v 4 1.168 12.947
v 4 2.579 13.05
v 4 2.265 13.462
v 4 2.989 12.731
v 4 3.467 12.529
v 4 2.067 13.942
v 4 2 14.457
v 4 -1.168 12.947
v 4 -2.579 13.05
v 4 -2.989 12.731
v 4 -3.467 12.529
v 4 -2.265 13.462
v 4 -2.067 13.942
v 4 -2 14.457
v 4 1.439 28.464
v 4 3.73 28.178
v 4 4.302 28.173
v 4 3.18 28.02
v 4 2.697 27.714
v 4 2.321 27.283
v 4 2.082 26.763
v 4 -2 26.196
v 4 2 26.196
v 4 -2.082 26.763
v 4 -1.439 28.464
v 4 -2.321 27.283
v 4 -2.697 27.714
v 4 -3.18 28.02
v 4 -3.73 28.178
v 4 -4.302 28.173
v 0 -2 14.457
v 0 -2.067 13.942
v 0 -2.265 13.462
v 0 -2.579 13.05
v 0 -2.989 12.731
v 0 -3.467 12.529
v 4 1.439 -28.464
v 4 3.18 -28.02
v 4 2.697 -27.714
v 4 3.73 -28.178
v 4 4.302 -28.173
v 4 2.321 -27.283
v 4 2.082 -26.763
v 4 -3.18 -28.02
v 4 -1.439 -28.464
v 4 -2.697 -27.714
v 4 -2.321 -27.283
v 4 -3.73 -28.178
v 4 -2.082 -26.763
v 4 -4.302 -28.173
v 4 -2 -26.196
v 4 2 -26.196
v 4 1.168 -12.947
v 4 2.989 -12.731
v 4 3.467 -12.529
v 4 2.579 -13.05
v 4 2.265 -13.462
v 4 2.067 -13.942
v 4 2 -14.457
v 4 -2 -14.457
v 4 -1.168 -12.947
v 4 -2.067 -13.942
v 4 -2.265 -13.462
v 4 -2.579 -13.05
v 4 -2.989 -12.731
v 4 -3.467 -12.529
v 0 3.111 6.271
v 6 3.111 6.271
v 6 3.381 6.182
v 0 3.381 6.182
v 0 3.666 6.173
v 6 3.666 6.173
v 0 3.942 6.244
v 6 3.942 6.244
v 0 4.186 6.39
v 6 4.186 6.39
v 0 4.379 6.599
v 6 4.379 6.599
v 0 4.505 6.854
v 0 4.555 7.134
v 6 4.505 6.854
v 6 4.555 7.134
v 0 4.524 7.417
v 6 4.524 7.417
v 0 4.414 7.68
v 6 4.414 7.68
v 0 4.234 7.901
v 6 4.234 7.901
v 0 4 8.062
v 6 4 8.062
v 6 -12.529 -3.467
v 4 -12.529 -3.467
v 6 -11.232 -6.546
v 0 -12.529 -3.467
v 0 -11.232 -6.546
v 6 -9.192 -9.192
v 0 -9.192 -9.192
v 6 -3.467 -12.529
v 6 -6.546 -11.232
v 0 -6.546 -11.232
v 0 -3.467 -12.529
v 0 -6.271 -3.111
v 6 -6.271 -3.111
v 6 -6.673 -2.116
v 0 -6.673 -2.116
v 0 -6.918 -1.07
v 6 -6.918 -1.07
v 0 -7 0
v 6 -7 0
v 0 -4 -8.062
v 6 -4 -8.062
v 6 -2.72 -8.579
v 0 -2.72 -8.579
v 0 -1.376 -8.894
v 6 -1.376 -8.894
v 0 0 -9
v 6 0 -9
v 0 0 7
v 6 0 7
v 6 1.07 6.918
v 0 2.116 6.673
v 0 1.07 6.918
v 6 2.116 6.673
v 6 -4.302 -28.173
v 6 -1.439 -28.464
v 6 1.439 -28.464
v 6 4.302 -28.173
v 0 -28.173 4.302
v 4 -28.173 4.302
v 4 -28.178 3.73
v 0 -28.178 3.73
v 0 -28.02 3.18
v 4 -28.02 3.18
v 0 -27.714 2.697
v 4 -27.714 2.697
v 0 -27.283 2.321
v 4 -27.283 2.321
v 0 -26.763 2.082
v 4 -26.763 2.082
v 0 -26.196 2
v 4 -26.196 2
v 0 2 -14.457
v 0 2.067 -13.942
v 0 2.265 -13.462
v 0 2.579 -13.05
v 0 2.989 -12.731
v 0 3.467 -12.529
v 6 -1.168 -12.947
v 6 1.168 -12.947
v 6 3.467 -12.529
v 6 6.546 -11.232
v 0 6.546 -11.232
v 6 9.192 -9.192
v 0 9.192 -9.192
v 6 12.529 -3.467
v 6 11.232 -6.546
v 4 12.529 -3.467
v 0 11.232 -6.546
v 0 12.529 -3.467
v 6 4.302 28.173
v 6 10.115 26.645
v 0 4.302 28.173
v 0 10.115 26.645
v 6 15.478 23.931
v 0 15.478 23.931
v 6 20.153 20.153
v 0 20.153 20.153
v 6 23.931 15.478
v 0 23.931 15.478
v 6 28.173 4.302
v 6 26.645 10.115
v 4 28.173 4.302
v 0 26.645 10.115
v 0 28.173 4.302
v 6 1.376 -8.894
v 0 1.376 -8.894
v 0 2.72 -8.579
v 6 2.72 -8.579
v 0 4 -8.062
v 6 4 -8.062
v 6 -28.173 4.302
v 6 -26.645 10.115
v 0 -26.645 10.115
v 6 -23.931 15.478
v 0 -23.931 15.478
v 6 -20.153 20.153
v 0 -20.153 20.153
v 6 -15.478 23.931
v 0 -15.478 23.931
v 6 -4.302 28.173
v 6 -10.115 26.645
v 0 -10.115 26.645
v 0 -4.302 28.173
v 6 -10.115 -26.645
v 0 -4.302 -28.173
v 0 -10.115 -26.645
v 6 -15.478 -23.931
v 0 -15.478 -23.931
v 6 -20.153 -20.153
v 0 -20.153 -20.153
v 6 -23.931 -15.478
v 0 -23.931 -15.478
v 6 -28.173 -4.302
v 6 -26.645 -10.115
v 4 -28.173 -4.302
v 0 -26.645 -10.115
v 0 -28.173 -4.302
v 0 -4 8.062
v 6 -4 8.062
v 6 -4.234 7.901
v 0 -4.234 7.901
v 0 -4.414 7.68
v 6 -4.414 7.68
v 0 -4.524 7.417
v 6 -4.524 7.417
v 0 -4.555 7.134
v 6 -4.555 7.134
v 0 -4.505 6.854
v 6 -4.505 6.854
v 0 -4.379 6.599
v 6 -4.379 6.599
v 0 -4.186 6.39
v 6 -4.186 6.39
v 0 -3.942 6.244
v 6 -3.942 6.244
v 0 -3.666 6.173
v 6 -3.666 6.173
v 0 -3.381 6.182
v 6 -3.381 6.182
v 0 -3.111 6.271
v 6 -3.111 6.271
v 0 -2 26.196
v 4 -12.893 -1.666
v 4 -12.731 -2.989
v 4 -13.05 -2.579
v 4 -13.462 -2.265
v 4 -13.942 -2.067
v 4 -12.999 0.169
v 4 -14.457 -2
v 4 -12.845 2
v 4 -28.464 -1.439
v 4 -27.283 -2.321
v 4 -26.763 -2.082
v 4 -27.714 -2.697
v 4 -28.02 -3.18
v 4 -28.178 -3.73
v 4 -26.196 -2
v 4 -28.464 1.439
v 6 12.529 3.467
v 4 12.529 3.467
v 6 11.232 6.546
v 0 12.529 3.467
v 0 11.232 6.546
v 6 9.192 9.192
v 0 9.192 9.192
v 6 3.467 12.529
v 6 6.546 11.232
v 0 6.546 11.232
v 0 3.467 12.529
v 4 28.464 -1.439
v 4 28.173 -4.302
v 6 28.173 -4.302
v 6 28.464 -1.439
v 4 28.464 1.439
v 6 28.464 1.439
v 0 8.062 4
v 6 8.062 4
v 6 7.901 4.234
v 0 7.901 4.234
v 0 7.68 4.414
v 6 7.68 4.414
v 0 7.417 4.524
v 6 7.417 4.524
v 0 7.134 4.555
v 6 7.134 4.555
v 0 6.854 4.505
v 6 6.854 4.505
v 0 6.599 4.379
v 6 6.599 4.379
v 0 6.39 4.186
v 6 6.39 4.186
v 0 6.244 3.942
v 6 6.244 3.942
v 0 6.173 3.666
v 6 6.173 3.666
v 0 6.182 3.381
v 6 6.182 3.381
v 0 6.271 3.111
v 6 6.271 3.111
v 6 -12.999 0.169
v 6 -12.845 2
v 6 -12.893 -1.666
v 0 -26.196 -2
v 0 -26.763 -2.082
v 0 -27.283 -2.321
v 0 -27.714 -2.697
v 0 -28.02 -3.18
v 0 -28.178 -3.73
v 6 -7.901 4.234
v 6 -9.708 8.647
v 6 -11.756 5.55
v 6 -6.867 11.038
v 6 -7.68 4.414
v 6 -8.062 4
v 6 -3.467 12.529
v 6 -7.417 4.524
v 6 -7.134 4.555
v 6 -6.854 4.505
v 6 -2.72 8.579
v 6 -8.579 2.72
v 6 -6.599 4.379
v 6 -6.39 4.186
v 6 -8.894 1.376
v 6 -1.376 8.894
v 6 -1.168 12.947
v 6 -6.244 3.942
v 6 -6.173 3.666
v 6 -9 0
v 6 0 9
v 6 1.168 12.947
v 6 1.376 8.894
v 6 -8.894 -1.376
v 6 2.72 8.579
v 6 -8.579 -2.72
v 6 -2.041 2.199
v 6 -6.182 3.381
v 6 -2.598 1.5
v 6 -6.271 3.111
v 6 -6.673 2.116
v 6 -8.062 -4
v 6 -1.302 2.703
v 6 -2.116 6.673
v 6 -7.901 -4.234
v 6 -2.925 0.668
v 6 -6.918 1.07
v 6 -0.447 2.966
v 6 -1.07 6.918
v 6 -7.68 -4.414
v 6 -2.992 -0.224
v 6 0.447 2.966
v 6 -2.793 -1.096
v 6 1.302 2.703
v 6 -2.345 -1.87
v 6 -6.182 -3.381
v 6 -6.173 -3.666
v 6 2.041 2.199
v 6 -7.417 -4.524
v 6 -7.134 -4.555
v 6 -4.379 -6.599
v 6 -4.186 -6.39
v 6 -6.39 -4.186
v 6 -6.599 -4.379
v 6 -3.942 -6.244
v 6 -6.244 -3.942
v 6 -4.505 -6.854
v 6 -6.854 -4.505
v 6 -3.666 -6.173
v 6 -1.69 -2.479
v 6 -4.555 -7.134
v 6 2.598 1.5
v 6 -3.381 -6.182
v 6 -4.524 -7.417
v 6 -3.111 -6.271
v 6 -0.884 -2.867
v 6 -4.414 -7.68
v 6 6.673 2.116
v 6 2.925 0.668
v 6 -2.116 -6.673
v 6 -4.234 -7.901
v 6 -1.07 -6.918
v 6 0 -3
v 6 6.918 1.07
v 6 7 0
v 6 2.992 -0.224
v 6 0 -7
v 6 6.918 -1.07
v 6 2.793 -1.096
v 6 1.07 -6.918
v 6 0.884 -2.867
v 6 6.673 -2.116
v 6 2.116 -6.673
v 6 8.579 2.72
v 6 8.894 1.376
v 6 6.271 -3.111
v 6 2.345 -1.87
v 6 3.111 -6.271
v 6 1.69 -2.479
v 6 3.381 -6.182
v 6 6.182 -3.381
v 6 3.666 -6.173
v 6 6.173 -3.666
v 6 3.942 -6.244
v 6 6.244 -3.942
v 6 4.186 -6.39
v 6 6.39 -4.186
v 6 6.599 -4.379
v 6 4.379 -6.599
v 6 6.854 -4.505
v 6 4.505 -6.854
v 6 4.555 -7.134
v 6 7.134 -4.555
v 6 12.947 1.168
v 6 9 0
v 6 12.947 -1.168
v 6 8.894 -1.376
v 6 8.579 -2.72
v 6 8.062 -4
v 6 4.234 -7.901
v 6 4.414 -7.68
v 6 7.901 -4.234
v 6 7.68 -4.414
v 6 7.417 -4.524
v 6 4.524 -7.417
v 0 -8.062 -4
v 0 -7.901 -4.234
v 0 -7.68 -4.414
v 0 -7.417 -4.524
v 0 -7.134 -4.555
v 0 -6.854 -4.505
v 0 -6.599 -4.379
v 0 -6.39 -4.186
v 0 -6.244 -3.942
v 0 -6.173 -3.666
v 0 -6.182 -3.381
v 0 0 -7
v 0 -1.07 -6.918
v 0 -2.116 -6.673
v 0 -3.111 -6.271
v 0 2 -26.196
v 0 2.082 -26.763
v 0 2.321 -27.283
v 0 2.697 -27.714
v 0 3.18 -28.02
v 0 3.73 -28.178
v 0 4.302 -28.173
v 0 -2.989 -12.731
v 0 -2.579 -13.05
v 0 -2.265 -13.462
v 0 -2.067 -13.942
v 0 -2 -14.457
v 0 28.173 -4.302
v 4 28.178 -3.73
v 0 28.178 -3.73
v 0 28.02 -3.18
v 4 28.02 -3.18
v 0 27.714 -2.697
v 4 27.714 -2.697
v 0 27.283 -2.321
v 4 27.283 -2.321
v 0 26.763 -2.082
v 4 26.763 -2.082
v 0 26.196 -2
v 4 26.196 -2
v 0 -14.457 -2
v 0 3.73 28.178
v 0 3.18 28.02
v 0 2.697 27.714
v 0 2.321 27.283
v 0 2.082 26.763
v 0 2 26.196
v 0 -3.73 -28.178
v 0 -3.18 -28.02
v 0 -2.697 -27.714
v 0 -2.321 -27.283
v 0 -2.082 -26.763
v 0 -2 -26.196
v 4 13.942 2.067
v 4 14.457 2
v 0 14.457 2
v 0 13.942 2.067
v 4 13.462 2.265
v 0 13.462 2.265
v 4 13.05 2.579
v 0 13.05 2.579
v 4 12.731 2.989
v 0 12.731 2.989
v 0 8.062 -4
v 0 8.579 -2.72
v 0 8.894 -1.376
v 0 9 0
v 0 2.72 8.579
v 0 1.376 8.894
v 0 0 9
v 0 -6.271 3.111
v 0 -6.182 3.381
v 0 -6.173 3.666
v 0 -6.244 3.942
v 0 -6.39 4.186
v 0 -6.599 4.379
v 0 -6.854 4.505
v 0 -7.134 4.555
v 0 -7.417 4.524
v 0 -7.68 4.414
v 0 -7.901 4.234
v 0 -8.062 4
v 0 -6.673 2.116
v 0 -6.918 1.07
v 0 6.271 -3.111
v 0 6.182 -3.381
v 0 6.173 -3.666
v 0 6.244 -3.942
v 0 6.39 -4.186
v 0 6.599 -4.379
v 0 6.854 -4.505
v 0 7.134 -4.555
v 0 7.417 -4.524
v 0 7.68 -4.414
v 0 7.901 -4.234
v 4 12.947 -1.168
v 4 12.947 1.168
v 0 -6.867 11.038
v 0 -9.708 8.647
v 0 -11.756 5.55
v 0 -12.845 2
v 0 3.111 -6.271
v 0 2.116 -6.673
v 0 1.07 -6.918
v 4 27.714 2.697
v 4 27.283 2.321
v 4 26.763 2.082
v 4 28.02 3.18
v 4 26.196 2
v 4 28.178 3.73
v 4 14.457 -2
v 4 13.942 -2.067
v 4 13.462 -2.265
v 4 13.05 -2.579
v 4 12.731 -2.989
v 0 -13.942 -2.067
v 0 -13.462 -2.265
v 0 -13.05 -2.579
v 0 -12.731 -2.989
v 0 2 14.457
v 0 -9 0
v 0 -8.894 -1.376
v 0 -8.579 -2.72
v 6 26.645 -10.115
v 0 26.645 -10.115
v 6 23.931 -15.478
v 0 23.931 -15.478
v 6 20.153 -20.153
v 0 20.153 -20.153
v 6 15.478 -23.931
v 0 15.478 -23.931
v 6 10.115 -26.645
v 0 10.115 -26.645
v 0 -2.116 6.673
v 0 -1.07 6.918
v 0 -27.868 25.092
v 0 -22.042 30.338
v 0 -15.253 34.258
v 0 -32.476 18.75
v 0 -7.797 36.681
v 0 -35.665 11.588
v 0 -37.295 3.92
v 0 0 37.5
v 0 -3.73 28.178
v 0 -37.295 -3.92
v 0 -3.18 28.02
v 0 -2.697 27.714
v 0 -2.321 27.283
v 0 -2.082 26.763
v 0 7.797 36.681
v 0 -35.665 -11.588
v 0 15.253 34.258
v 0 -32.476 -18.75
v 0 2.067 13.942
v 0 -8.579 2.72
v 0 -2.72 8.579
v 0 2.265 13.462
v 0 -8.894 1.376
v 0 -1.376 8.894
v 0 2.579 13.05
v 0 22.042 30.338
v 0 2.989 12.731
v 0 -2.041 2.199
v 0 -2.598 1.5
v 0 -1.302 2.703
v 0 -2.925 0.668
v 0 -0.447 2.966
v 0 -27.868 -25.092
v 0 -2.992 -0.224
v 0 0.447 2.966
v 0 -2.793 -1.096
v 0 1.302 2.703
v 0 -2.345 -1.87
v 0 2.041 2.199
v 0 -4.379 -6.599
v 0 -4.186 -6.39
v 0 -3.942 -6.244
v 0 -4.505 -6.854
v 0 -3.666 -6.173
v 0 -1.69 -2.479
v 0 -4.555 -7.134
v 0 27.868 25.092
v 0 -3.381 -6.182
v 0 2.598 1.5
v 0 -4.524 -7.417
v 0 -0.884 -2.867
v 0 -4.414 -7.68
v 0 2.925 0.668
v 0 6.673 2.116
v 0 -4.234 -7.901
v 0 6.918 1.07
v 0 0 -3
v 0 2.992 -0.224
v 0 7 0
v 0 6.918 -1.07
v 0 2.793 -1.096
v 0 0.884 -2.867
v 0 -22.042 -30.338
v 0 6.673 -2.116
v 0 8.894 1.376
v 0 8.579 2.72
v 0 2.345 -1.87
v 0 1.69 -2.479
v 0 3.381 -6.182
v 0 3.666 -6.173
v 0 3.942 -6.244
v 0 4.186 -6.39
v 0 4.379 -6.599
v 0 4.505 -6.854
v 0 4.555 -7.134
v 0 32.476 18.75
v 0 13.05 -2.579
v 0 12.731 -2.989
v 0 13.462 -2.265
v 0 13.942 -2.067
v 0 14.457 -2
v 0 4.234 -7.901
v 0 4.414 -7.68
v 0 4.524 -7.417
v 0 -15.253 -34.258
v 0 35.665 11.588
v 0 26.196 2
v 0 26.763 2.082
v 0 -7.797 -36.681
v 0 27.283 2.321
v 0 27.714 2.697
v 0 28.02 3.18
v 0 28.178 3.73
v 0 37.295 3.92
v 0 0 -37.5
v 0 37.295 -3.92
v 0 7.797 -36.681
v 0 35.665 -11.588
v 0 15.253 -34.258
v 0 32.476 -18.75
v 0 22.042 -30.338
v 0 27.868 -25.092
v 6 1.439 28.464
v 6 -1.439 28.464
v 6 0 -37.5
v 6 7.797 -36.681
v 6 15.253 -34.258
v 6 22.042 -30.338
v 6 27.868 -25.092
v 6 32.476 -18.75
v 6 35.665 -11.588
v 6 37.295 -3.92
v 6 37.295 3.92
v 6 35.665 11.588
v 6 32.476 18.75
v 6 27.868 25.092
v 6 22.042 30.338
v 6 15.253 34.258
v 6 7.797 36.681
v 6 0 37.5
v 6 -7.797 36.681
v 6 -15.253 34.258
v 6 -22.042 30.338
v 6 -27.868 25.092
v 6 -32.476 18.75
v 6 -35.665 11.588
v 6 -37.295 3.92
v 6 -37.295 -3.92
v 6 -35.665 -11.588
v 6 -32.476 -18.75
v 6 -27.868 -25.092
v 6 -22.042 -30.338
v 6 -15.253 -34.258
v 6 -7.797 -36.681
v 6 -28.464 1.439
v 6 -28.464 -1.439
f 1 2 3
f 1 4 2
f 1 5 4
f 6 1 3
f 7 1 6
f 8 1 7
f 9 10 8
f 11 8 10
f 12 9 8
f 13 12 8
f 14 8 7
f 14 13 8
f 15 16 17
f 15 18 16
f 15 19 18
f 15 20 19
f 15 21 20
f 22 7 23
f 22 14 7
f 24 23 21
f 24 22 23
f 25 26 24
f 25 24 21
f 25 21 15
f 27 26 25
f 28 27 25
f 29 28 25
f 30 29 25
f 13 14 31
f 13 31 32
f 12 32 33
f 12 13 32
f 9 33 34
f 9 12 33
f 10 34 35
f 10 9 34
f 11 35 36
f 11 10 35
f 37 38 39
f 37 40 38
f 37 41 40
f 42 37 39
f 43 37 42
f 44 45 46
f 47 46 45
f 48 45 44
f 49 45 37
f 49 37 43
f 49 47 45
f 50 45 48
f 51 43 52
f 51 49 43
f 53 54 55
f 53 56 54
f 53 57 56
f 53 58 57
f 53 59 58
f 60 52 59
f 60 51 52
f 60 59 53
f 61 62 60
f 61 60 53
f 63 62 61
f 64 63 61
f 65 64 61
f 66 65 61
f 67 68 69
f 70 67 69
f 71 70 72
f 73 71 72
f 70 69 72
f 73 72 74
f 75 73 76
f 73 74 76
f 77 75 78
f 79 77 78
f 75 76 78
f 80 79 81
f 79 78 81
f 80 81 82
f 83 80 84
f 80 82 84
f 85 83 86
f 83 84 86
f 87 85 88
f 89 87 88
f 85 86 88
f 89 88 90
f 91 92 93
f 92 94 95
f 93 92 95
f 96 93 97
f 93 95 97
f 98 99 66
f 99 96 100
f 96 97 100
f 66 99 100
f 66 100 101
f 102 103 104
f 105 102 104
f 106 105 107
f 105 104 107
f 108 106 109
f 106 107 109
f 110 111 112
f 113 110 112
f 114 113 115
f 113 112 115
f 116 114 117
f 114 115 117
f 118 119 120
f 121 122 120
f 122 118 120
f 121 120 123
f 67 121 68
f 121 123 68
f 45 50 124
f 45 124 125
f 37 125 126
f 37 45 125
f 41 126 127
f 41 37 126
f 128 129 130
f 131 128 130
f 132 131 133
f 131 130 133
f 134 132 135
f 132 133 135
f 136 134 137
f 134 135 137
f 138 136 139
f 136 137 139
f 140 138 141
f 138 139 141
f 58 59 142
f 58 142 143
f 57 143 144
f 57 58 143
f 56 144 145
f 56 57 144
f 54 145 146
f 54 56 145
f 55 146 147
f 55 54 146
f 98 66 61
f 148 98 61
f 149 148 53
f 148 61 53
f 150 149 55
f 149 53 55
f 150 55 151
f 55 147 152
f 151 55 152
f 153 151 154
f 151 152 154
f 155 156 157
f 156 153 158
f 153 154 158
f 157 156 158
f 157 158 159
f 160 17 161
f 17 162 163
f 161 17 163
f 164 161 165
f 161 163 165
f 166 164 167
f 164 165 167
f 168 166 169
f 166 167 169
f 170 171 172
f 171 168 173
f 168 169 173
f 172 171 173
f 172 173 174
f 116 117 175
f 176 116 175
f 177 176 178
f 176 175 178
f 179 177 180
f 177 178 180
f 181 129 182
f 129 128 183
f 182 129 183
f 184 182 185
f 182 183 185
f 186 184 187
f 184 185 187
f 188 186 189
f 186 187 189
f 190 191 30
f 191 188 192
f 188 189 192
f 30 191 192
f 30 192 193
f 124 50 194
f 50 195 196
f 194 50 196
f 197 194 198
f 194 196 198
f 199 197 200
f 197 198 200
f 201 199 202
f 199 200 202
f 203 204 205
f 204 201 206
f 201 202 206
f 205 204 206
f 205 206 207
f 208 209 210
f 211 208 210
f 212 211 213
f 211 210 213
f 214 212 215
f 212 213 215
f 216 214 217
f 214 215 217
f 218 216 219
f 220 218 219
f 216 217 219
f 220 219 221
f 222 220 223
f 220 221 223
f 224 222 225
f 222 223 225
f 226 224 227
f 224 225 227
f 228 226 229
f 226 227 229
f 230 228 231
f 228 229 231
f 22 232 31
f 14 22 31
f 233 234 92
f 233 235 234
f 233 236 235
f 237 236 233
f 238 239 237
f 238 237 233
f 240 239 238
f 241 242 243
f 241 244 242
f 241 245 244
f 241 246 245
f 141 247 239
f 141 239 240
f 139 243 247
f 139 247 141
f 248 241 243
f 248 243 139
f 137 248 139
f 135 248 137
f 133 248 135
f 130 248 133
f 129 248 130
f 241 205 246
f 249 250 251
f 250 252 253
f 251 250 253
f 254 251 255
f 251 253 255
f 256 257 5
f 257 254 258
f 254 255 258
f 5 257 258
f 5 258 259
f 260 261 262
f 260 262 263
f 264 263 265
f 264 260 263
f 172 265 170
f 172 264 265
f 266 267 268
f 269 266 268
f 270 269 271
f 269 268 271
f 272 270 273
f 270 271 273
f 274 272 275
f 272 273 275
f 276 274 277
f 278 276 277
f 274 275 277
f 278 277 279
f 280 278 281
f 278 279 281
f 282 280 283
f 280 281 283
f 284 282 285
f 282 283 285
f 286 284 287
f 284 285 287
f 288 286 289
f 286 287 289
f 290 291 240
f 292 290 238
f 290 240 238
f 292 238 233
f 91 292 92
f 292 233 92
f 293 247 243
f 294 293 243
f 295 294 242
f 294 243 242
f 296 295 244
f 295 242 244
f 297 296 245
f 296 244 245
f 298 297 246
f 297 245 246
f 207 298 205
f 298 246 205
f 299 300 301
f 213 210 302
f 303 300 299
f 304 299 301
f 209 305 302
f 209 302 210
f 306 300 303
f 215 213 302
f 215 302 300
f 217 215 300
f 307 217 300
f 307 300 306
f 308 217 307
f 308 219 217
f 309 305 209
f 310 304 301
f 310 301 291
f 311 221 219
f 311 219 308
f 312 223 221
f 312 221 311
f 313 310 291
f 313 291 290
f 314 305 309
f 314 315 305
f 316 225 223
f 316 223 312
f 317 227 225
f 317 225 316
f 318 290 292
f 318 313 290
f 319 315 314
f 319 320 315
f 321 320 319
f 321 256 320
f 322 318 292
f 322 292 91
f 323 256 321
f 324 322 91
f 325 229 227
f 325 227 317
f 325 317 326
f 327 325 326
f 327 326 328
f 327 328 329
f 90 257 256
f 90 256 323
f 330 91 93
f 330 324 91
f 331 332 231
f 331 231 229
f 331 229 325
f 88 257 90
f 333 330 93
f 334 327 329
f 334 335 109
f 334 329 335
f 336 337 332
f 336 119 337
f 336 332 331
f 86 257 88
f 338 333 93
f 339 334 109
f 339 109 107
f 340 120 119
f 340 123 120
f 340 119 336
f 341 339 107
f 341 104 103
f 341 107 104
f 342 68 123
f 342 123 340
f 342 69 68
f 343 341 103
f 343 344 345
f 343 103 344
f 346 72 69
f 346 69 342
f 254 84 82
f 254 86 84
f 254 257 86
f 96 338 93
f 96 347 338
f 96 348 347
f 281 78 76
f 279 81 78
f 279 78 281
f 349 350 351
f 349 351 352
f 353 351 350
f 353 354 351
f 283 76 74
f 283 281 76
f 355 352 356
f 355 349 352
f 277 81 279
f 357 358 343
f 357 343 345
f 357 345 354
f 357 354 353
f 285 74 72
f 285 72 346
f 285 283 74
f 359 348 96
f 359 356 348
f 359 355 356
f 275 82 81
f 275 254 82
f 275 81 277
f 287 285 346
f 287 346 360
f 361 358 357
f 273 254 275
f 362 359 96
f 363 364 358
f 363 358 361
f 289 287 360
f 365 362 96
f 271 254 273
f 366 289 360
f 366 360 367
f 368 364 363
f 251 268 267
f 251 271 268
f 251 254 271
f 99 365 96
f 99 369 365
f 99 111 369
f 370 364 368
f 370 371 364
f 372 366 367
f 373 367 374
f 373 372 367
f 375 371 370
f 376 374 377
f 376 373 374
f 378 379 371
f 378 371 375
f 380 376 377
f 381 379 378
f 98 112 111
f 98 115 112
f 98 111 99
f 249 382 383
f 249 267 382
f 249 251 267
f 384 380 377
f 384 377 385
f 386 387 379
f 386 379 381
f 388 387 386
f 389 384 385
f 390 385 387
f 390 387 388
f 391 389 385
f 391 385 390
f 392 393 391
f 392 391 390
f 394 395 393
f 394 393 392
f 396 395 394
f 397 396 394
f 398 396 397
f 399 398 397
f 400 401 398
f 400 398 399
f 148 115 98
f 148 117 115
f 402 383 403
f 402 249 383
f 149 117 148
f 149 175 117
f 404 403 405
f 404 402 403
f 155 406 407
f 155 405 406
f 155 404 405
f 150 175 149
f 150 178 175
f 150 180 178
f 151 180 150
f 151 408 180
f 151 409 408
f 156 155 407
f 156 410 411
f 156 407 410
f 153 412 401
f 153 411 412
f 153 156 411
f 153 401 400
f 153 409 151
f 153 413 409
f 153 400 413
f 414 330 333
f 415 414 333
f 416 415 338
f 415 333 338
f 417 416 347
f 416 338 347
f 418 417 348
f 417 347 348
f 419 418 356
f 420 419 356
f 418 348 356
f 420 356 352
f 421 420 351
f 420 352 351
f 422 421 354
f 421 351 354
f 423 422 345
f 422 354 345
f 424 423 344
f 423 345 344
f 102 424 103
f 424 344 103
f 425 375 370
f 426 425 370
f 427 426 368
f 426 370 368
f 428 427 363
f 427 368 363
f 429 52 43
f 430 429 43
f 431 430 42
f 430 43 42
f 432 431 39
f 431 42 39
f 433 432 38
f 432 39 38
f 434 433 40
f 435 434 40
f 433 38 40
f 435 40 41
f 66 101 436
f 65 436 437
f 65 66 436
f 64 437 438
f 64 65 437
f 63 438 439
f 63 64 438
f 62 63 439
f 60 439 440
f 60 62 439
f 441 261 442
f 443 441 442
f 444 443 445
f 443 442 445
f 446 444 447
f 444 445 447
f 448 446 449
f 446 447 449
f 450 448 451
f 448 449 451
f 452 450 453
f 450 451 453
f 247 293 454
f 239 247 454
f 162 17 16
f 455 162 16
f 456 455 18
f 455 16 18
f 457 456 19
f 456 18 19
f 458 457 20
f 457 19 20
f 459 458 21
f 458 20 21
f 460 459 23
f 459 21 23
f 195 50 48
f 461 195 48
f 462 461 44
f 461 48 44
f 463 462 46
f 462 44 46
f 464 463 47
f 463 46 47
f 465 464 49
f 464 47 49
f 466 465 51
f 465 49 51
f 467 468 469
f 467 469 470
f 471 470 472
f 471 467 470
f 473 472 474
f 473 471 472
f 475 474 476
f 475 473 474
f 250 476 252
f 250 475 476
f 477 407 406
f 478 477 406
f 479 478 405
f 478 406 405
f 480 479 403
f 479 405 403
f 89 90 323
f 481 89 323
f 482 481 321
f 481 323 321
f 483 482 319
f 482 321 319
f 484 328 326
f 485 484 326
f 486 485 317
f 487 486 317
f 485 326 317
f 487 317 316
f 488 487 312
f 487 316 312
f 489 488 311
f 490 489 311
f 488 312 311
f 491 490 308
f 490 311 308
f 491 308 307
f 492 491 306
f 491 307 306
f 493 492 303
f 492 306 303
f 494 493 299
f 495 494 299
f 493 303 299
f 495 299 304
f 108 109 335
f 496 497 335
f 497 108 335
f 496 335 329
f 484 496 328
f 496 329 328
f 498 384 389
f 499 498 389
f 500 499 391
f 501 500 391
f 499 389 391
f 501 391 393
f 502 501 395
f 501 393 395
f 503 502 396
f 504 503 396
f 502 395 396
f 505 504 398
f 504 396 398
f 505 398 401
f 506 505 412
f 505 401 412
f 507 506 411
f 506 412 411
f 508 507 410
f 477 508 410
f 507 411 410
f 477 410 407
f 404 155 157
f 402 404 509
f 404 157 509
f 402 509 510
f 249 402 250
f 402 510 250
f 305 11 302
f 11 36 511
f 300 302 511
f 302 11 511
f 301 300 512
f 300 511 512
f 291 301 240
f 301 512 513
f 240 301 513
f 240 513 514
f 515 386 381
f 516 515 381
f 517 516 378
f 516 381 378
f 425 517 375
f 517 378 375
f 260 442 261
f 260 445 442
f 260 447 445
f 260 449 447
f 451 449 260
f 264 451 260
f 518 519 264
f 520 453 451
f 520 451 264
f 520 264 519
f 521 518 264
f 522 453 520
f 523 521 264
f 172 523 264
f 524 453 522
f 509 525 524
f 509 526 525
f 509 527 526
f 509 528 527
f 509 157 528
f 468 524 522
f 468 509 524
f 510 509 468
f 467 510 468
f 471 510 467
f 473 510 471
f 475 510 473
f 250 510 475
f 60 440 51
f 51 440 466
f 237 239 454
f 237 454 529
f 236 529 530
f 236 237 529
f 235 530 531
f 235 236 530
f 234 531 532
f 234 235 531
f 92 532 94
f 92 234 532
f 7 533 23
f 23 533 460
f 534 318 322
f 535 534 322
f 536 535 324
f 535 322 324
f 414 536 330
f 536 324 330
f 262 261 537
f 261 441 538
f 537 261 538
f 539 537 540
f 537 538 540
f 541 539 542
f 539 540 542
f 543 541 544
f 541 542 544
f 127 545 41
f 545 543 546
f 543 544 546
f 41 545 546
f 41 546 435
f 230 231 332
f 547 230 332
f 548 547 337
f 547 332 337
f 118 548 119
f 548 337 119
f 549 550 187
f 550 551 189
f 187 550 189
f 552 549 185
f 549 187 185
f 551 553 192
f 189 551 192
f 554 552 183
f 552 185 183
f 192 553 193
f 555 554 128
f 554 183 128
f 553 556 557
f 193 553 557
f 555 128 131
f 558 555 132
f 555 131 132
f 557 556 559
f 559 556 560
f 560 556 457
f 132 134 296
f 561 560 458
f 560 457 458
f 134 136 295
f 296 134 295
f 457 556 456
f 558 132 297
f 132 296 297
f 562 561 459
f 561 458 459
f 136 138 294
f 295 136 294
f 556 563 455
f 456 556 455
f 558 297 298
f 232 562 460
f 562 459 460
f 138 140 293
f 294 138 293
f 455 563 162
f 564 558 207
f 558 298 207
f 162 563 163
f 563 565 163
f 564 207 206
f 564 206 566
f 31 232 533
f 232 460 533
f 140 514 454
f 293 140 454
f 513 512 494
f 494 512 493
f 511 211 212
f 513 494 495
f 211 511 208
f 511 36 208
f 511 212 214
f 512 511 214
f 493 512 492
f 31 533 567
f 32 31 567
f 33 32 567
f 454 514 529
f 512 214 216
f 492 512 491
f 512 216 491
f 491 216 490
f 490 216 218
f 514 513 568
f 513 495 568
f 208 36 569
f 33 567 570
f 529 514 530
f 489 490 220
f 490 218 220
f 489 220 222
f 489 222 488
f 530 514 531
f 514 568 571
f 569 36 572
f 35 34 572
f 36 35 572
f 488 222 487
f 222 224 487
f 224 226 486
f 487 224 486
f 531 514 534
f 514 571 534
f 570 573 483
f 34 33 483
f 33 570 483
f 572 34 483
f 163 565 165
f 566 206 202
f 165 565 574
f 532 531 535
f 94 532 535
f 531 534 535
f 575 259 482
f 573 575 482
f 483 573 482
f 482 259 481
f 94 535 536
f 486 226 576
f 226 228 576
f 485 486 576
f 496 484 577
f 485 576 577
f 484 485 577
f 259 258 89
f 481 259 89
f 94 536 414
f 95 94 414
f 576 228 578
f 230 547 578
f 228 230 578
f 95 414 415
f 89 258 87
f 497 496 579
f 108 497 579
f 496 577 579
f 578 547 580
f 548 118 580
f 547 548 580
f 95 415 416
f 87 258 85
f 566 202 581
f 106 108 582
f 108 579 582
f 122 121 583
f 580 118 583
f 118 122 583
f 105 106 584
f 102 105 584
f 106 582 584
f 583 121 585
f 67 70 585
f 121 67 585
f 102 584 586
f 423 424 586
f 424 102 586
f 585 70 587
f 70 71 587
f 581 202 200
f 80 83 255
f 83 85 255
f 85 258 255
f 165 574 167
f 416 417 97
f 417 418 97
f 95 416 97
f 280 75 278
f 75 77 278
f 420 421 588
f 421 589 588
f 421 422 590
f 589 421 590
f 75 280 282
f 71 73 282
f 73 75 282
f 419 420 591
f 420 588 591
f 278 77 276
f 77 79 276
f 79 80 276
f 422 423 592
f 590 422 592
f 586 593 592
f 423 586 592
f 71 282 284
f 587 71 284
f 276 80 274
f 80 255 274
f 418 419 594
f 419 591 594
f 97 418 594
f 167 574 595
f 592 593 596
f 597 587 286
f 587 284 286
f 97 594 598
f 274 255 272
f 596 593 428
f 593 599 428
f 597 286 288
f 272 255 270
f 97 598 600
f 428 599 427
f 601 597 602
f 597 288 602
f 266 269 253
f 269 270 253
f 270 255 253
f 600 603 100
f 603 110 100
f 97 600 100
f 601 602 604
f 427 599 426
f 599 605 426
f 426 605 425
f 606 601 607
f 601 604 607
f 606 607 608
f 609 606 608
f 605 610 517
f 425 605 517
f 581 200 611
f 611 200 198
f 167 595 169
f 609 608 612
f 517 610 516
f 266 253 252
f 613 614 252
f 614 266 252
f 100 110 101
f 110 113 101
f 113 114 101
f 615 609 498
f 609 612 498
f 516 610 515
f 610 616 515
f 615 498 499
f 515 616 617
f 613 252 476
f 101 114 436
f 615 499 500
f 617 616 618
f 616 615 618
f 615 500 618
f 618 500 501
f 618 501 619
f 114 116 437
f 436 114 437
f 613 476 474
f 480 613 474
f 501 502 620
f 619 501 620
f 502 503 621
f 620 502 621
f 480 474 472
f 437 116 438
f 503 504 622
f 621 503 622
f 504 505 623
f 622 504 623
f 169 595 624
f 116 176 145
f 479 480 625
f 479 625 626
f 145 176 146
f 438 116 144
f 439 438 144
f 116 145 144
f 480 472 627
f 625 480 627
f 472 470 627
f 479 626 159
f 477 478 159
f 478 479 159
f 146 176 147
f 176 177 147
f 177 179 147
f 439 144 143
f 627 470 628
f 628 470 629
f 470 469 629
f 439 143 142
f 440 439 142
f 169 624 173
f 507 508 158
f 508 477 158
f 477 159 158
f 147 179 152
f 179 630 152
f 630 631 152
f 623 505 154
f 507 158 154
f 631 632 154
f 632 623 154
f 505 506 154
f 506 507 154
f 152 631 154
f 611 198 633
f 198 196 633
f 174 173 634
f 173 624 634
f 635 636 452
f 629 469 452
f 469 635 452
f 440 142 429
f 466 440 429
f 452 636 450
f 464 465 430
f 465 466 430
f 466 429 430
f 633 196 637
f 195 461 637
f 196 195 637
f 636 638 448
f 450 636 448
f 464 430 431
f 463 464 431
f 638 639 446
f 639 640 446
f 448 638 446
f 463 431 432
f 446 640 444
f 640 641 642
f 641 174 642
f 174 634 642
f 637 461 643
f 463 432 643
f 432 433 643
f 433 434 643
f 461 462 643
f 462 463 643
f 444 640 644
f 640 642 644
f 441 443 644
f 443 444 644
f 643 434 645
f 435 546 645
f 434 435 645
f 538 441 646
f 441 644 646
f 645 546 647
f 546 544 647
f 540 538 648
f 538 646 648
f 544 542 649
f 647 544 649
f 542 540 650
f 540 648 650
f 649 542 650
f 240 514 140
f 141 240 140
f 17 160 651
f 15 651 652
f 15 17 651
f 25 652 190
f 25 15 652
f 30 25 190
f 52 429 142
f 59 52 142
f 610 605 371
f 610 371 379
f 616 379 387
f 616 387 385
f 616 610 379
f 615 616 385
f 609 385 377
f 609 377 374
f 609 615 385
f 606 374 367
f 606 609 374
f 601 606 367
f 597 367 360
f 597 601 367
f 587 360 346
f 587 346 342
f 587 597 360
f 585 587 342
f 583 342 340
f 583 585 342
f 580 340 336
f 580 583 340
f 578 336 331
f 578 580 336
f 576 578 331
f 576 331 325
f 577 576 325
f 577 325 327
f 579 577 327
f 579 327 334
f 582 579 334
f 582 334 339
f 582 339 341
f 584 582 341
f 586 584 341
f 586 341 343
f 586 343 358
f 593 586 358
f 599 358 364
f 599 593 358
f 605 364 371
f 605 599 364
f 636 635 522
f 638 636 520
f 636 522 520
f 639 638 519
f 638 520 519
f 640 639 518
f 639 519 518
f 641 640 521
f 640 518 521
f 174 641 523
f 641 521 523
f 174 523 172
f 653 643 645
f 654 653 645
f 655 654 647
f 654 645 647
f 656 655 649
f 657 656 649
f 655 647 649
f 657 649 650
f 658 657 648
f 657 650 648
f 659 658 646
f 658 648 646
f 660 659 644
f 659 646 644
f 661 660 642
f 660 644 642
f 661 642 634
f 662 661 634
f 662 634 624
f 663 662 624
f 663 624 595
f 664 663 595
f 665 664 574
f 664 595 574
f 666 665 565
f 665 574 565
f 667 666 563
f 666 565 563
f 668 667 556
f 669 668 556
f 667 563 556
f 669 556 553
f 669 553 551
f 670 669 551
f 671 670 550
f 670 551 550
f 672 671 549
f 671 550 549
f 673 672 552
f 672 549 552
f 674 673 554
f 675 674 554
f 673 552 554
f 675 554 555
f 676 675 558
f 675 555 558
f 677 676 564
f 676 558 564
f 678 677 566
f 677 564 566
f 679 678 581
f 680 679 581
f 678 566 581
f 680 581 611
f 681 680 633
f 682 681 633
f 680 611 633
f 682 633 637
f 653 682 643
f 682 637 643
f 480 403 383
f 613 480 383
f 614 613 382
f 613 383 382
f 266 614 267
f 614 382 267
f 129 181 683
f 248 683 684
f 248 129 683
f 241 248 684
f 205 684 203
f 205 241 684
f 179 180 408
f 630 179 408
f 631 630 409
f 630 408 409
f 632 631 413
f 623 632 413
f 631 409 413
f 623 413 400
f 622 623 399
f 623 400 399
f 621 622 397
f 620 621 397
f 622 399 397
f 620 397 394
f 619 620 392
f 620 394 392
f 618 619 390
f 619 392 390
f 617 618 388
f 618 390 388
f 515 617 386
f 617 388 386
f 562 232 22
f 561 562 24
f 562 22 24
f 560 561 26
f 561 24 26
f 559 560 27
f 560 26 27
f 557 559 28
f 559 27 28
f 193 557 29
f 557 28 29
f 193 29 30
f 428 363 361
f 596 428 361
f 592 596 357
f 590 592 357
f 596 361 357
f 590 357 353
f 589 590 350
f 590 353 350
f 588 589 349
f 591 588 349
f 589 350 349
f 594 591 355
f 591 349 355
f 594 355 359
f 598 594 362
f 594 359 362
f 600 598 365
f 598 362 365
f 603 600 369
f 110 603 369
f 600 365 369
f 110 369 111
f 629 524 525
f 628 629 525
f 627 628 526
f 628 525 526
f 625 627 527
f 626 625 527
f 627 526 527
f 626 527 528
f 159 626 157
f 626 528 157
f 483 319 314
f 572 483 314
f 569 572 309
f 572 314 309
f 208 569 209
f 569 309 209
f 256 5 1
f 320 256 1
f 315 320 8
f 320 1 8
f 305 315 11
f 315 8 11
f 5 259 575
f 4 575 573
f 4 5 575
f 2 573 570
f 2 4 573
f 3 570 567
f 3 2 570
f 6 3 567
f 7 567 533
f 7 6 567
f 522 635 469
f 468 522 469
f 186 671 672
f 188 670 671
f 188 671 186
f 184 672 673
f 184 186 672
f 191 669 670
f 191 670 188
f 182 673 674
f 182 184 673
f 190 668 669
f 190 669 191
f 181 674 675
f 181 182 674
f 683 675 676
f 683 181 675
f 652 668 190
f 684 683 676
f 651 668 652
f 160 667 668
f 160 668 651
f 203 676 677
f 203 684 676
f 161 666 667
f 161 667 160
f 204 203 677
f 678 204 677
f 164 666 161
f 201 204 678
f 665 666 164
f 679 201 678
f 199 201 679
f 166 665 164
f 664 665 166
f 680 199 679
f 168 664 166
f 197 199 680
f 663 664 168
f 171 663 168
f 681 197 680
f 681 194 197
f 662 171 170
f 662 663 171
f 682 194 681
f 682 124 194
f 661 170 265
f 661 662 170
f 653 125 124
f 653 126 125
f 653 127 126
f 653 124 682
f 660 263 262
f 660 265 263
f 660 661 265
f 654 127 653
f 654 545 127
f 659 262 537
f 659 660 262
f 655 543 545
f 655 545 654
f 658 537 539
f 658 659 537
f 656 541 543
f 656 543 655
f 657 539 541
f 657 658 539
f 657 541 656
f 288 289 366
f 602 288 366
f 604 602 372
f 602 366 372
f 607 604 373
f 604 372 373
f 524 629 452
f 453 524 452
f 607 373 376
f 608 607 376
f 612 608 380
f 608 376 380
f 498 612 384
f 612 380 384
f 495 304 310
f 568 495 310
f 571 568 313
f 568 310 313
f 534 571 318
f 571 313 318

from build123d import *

# Parameters (mm, degrees)
SKETCH1_R           = 37.5
SKETCH1_R_2         = 3
BOSS_EXTRUDE1_DEPTH = 6
FILLET1_R           = 2
SKETCH2_R           = 1
CUT_EXTRUDE1_DEPTH  = 10
CIRPATTERN1_COUNT   = 4
CUT_EXTRUDE2_START  = -2
SKETCH3_R           = 28.5
SKETCH3_R_2         = 13
CUT_EXTRUDE2_DEPTH  = 2


with BuildPart() as part:
    # Sketch1 → Boss-Extrude1 (new body)
    with BuildSketch(Plane(origin=(0, 0, 0), x_dir=(0, 0, -1), z_dir=(1, 0, 0))):
        Circle(SKETCH1_R)
        with BuildLine():
            ThreePointArc((-12.845232579, -2), (-9.192388155, -9.192388155), (-2, -12.845232579))
            Line((-2, -12.845232579), (-2, -28.429737952))
            ThreePointArc((-2, -28.429737952), (-20.152543264, -20.152543264), (-28.429737952, -2))
            Line((-28.429737952, -2), (-12.845232579, -2))
        make_face(mode=Mode.SUBTRACT)
        with BuildLine():
            ThreePointArc((2, -12.845232579), (9.192388155, -9.192388155), (12.845232579, -2))
            Line((12.845232579, -2), (28.429737952, -2))
            ThreePointArc((28.429737952, -2), (20.152543264, -20.152543264), (2, -28.429737952))
            Line((2, -28.429737952), (2, -12.845232579))
        make_face(mode=Mode.SUBTRACT)
        Circle(SKETCH1_R_2, mode=Mode.SUBTRACT)
        with BuildLine():
            ThreePointArc((-2, 12.845232579), (-9.192388155, 9.192388155), (-12.845232579, 2))
            Line((-12.845232579, 2), (-28.429737952, 2))
            ThreePointArc((-28.429737952, 2), (-20.152543264, 20.152543264), (-2, 28.429737952))
            Line((-2, 28.429737952), (-2, 12.845232579))
        make_face(mode=Mode.SUBTRACT)
        with BuildLine():
            ThreePointArc((12.845232579, 2), (9.192388155, 9.192388155), (2, 12.845232579))
            Line((2, 12.845232579), (2, 28.429737952))
            ThreePointArc((2, 28.429737952), (20.152543264, 20.152543264), (28.429737952, 2))
            Line((28.429737952, 2), (12.845232579, 2))
        make_face(mode=Mode.SUBTRACT)
    extrude(amount=BOSS_EXTRUDE1_DEPTH)

    # Fillet1
    fillet1_edges = [part.edges().sort_by_distance(p)[0] for p in [
        (3, 28.429737952, -2),
        (3, 12.845232579, -2),
        (3, 2, -12.845232579),
        (3, 2, -28.429737952),
        (3, 28.429737952, 2),
        (3, 2, 28.429737952),
        (3, 2, 12.845232579),
        (3, 12.845232579, 2),
        (3, -2, 28.429737952),
        (3, -28.429737952, 2),
        (3, -2, 12.845232579),
        (3, -28.429737952, -2),
        (3, -2, -28.429737952),
        (3, -2, -12.845232579),
        (3, -12.845232579, -2),
    ]]
    fillet(fillet1_edges, radius=FILLET1_R)

    # Sketch2 → Cut-Extrude1 (cut)
    with BuildSketch(Plane(origin=(6, 0, 0), x_dir=(0, 0, -1), z_dir=(1, 0, 0))):
        with BuildLine():
            ThreePointArc((4, 8.062257748), (2.054224947, 8.762428879), (0, 9))
            ThreePointArc((0, 9), (-2.054224947, 8.762428879), (-4, 8.062257748))
            ThreePointArc((-4, 8.062257748), (-3.028509279, 8.016287917), (-2.555555556, 7.166451332))
            ThreePointArc((-2.555555556, 7.166451332), (-2.70571897, 6.639405055), (-3.111111111, 6.270644915))
            ThreePointArc((-3.111111111, 6.270644915), (-1.597730514, 6.815222462), (0, 7))
            ThreePointArc((0, 7), (1.597730514, 6.815222462), (3.111111111, 6.270644915))
            ThreePointArc((3.111111111, 6.270644915), (2.659749139, 7.610895776), (4, 8.062257748))
        make_face()
        with Locations((-3.555555556, 7.166451332)):
            Circle(SKETCH2_R)
        with Locations((3.555555556, 7.166451332)):
            Circle(SKETCH2_R)
    cut_extrude1 = extrude(amount=-CUT_EXTRUDE1_DEPTH, mode=Mode.SUBTRACT)

    # CirPattern1: Cut-Extrude1 ×4 about axis
    cirpattern1_axis = Axis((0, 0, 0), (1, 0, 0))
    for i in range(1, CIRPATTERN1_COUNT):
        add(cut_extrude1.rotate(cirpattern1_axis, i * 360 / CIRPATTERN1_COUNT), mode=Mode.SUBTRACT)

    # Sketch3 → Cut-Extrude2 (cut)
    with BuildSketch(Plane(origin=(6, 0, 0), x_dir=(0, 0, -1), z_dir=(1, 0, 0)).offset(CUT_EXTRUDE2_START)):
        with Locations(Location((0, 0, 0), (0, 0, 171.318398303))):
            Circle(SKETCH3_R)
        with Locations(Location((0, 0, 0), (0, 0, 164.533990047))):
            Circle(SKETCH3_R_2, mode=Mode.SUBTRACT)
    extrude(amount=CUT_EXTRUDE2_DEPTH, mode=Mode.SUBTRACT)


solid = part.part
